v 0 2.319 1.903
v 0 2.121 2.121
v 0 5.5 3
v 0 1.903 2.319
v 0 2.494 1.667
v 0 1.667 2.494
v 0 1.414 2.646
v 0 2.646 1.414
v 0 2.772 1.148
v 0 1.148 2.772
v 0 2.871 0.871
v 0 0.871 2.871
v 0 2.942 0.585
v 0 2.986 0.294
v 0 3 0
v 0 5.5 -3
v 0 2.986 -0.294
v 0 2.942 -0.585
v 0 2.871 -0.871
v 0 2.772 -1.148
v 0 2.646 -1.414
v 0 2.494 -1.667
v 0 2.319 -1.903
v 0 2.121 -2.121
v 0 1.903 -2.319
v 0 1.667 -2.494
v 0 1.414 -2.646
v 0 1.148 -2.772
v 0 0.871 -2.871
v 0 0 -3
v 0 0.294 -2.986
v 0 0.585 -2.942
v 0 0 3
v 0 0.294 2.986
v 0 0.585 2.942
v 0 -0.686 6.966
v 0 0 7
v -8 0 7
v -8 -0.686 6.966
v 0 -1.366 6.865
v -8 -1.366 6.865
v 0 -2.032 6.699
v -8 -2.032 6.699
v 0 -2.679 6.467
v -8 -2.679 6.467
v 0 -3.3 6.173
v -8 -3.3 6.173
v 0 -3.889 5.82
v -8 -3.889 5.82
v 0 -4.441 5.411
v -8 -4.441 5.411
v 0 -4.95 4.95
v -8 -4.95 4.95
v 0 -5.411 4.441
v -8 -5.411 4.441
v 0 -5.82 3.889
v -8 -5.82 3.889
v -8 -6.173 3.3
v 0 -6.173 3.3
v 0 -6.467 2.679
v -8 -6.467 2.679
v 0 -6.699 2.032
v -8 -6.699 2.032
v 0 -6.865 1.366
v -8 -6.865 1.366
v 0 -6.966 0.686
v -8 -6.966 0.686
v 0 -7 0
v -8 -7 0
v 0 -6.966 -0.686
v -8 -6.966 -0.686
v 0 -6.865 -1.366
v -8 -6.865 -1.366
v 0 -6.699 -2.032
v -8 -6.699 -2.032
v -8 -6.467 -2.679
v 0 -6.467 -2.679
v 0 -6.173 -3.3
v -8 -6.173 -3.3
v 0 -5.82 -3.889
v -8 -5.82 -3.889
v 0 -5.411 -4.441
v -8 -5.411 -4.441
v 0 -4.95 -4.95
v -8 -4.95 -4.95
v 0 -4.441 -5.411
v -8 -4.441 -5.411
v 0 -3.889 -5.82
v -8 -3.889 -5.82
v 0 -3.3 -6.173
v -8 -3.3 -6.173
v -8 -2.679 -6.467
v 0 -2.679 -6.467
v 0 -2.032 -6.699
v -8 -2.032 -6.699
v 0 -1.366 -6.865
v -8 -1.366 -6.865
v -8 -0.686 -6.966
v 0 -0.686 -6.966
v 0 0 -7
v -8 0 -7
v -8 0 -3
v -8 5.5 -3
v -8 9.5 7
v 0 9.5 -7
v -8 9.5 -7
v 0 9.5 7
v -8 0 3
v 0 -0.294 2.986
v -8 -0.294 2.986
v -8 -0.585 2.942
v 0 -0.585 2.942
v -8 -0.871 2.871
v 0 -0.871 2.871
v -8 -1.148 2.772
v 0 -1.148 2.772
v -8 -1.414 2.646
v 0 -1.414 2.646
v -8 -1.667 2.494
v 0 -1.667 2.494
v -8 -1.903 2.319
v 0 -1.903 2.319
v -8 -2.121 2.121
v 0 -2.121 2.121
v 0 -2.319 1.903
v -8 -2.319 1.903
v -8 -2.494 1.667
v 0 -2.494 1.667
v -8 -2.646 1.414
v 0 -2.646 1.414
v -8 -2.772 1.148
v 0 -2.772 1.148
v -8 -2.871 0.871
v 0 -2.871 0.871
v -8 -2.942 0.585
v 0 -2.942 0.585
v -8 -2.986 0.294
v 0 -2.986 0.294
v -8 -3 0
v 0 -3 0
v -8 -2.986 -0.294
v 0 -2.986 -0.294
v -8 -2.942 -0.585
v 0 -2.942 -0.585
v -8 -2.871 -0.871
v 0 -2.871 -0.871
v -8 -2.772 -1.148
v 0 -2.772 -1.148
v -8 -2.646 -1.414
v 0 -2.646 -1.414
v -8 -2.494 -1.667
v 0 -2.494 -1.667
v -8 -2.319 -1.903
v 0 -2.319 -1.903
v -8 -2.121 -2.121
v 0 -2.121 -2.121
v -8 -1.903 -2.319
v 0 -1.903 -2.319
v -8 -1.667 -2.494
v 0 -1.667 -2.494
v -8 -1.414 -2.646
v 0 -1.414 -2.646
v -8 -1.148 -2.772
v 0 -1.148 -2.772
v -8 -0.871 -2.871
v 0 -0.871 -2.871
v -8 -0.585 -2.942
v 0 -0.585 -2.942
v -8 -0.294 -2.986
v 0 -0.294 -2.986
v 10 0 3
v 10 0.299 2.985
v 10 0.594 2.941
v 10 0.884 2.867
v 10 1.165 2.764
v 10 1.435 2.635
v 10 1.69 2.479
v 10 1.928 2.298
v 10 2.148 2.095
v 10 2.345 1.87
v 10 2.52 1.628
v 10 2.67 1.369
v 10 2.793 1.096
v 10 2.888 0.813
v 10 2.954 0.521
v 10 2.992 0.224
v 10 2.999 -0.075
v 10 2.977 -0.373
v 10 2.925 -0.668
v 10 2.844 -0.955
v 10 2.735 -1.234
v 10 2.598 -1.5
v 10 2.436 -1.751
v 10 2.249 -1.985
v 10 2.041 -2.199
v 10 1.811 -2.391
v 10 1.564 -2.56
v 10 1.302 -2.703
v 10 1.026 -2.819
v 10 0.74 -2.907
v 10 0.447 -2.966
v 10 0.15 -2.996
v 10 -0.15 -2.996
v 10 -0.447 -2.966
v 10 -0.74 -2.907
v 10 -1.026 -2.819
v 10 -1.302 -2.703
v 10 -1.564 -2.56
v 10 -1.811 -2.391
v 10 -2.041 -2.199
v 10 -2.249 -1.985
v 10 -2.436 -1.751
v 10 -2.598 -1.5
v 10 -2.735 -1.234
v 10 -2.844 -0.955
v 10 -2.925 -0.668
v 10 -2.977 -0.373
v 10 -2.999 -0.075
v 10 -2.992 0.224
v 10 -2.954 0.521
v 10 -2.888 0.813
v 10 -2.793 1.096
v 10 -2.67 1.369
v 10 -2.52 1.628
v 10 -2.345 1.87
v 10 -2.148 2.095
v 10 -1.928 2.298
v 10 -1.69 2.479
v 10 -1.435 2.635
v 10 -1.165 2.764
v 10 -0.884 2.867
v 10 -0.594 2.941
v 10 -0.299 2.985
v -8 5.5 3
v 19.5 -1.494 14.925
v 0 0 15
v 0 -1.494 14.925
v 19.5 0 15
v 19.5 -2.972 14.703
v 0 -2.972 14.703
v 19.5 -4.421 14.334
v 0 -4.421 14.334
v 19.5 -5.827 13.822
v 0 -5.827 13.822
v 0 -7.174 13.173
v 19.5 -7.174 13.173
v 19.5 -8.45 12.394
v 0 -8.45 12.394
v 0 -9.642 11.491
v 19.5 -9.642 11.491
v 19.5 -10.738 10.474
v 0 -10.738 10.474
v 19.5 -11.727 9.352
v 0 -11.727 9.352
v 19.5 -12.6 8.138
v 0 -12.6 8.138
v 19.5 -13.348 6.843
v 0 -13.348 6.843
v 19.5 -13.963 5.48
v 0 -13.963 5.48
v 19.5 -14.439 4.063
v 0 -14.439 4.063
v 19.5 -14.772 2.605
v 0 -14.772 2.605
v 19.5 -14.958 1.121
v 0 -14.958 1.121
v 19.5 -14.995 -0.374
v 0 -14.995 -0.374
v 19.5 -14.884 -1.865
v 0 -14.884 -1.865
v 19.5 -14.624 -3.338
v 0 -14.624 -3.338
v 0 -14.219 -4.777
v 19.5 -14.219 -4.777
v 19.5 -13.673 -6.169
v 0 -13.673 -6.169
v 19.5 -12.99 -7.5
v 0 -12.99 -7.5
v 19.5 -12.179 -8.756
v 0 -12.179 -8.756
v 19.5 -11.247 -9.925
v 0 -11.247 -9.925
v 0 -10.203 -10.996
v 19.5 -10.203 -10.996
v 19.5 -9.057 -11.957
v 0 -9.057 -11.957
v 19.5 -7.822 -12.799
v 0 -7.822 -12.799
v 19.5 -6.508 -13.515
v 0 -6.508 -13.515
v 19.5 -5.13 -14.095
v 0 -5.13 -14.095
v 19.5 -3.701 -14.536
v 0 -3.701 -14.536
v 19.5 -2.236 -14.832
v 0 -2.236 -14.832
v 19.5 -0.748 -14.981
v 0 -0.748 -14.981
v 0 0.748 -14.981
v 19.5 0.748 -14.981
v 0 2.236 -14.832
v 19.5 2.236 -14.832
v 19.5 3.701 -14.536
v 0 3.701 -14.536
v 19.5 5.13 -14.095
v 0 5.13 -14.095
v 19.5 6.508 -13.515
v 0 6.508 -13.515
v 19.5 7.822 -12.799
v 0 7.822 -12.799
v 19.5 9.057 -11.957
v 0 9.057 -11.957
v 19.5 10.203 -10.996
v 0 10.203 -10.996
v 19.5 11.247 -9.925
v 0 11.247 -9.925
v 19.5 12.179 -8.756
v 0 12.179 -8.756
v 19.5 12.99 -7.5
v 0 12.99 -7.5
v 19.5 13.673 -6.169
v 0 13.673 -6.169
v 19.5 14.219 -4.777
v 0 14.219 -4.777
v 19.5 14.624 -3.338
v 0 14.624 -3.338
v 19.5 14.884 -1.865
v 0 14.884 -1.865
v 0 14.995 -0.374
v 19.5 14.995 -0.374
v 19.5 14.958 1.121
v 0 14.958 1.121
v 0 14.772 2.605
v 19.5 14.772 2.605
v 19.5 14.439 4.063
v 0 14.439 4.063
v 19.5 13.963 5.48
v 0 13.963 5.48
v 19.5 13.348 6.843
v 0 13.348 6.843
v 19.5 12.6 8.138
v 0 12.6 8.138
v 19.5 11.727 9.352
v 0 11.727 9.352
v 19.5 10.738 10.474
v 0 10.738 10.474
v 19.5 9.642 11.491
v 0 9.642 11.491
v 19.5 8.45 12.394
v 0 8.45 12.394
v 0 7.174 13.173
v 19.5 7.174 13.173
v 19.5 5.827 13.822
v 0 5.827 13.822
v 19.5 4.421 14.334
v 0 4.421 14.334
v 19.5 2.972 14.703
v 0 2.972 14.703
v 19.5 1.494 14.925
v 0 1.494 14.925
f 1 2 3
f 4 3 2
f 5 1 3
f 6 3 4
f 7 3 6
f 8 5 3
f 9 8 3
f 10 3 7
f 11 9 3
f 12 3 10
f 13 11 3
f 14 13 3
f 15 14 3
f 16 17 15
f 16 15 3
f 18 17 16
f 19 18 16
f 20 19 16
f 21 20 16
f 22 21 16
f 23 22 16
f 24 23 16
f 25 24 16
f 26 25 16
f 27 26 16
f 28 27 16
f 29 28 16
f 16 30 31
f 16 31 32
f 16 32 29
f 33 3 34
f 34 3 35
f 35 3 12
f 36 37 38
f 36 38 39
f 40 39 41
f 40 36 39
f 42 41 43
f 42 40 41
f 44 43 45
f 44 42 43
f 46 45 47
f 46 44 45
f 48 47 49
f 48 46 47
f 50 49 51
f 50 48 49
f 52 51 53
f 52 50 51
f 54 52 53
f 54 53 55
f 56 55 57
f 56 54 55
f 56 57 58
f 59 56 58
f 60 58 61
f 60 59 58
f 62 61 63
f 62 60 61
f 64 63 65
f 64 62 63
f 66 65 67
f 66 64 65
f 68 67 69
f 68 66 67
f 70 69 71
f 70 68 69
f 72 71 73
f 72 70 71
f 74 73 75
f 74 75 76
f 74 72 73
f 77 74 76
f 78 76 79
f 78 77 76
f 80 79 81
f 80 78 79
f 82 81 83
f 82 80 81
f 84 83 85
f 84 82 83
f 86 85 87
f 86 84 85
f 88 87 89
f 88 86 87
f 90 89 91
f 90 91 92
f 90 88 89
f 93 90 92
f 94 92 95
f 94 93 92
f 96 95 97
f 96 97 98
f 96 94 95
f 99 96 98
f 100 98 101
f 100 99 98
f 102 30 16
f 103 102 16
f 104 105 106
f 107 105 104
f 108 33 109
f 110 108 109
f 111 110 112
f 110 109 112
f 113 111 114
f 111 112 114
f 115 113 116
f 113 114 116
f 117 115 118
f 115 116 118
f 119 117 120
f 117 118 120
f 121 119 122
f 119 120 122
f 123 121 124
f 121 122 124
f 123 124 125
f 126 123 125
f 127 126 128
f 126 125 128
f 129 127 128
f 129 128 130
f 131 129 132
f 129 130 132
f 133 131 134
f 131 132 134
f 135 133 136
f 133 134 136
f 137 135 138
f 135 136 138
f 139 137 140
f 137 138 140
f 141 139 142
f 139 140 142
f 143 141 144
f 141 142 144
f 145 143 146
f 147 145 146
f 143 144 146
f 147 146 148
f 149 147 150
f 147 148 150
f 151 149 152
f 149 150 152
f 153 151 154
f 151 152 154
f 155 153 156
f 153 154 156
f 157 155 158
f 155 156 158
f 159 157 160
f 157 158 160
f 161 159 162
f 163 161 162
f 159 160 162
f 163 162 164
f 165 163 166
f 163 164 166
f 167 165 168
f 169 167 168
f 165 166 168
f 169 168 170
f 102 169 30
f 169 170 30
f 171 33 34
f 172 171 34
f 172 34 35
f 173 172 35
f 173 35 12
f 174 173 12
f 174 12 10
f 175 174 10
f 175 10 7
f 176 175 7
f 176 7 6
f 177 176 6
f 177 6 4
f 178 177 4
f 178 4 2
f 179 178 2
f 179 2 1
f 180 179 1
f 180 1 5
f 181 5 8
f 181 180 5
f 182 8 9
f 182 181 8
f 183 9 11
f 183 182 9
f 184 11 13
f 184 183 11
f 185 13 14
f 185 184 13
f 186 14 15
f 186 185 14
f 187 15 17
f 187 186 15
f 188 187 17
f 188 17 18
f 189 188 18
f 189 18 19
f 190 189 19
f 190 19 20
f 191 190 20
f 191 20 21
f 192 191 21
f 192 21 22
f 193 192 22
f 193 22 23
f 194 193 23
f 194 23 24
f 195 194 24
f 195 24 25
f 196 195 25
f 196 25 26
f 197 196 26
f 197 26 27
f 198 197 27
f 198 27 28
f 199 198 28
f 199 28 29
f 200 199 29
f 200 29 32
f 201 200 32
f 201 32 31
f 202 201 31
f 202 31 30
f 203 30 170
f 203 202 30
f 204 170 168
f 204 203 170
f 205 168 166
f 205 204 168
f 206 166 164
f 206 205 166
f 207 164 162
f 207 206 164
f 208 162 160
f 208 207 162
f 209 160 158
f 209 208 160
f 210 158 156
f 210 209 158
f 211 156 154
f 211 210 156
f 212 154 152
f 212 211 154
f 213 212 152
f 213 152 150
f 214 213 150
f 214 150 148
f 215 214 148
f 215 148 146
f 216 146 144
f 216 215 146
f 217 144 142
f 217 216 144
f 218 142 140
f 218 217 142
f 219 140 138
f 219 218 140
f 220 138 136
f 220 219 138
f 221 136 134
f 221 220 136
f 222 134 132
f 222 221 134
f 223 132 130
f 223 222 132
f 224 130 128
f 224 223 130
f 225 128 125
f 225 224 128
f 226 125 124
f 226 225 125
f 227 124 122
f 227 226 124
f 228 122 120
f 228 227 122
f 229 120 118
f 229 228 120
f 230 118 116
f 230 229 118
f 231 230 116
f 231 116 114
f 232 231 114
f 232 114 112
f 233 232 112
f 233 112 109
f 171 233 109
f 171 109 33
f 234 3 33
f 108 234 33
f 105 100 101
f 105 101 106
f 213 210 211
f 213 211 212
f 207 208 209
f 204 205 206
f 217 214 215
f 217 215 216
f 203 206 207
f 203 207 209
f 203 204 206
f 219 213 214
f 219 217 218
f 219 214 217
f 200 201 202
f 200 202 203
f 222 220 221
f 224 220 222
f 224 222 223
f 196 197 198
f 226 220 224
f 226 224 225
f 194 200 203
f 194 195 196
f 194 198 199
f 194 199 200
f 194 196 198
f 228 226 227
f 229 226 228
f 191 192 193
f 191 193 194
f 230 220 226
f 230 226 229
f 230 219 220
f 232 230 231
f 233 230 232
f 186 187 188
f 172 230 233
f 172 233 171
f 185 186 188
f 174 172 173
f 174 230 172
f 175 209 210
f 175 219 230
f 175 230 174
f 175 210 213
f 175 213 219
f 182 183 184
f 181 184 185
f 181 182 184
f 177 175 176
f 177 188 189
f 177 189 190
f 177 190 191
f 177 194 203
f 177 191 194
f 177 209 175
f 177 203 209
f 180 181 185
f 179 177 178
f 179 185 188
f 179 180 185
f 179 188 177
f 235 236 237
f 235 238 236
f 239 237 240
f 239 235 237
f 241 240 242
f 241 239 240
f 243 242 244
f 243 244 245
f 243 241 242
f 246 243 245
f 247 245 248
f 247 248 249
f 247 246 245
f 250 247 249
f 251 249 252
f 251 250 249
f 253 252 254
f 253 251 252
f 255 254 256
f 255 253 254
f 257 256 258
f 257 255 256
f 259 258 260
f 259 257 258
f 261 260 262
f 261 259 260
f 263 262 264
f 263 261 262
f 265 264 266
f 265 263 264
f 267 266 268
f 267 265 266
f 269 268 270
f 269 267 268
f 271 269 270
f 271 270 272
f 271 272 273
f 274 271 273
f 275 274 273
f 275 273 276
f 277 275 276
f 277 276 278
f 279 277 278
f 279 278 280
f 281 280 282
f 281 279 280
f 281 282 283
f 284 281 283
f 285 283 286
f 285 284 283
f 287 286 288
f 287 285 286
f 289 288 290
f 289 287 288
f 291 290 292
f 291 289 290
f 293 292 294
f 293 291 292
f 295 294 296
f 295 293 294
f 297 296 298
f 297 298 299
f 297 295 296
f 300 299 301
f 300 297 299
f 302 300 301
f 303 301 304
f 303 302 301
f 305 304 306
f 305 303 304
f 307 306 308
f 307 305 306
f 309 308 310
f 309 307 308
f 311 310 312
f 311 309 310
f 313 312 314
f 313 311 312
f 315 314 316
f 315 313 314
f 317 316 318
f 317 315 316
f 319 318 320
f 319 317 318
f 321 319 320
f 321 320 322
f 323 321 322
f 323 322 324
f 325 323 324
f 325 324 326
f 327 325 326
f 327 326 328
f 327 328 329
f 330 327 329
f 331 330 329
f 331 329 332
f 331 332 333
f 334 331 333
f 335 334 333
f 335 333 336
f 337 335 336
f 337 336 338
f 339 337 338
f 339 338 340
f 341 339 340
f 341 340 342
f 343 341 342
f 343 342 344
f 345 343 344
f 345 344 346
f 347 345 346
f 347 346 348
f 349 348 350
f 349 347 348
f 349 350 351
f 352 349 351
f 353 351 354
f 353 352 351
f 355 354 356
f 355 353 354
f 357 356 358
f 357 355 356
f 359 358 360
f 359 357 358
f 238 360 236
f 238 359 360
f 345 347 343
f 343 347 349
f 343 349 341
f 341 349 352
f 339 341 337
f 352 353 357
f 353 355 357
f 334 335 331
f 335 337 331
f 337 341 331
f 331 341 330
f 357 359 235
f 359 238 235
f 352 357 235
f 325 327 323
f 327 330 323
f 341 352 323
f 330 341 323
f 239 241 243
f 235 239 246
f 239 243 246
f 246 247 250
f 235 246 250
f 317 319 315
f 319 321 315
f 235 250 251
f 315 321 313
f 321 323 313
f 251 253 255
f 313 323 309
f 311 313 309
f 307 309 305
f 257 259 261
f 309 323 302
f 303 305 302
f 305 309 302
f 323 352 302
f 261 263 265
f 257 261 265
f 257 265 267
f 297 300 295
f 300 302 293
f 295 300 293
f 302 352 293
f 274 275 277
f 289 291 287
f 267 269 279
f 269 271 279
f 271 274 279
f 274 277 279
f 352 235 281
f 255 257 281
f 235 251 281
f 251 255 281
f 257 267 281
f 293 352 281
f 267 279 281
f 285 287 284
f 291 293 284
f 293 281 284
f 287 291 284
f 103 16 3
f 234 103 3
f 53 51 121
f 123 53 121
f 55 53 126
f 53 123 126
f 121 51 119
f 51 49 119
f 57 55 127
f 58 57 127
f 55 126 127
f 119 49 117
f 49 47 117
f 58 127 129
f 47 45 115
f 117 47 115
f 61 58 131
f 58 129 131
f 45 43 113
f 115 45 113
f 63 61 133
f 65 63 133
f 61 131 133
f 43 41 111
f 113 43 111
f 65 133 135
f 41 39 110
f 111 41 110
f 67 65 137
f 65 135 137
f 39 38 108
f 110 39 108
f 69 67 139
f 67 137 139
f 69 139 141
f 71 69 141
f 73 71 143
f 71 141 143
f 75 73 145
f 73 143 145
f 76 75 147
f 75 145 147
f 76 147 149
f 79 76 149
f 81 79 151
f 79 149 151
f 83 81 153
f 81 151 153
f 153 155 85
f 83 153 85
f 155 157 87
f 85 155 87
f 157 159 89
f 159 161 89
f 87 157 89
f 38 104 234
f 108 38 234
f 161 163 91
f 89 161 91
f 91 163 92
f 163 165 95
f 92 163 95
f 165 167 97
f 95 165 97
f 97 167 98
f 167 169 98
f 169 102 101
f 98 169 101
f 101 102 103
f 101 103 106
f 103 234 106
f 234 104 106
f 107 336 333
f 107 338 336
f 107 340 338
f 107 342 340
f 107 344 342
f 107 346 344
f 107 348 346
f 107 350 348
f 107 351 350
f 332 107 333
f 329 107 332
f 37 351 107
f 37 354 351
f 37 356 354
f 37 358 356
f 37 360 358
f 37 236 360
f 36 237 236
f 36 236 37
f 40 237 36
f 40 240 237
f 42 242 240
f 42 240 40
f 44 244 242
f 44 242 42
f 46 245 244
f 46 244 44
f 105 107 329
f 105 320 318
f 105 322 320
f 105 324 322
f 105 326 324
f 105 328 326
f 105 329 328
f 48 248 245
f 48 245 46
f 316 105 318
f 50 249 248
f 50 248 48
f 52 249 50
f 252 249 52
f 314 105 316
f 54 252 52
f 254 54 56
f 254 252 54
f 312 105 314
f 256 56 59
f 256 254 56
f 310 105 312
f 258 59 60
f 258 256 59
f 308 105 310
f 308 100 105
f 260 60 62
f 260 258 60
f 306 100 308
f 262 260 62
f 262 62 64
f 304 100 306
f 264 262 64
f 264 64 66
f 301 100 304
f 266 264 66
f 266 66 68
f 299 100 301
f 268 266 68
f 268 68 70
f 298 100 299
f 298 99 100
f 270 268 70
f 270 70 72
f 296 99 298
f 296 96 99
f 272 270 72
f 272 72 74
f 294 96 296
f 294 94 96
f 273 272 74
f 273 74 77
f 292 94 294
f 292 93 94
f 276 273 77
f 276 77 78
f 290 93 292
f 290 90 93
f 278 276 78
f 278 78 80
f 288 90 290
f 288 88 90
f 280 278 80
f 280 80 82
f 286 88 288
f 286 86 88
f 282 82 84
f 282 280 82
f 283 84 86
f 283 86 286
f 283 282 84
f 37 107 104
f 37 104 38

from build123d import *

# Parameters (mm, degrees)
SKETCH1_W           = 19.5
SKETCH1_H           = 15
BOSS_EXTRUDE1_DEPTH = 8
CUT_EXTRUDE1_START  = -10
SKETCH3_R           = 3
CUT_EXTRUDE1_DEPTH  = 10


with BuildPart() as part:
    # Sketch1 → Revolve1 (revolve)
    with BuildSketch(Plane.XY, mode=Mode.PRIVATE) as revolve1_sk:
        with Locations((9.75, 7.5)):
            Rectangle(SKETCH1_W, SKETCH1_H)
    revolve(revolve1_sk.sketch.rotate(Axis((0, 0, 0), (1, 0, 0)), 90), axis=Axis((0, 0, 0), (1, 0, 0)))

    # Sketch2 → Boss-Extrude1 (add)
    with BuildSketch(Plane.ZY):
        with BuildLine():
            Line((-7, 0), (-7, 9.5))
            Line((-7, 9.5), (7, 9.5))
            Line((7, 9.5), (7, 0))
            ThreePointArc((7, 0), (0, -7), (-7, 0))
        make_face()
        with BuildLine():
            Line((-3, 0), (-3, 5.5))
            Line((-3, 5.5), (3, 5.5))
            Line((3, 5.5), (3, 0))
            ThreePointArc((3, 0), (0, -3), (-3, 0))
        make_face(mode=Mode.SUBTRACT)
    extrude(amount=BOSS_EXTRUDE1_DEPTH)

    # Sketch3 → Cut-Extrude1 (cut)
    with BuildSketch(Plane.ZY.offset(CUT_EXTRUDE1_START)):
        Circle(SKETCH3_R)
    extrude(amount=CUT_EXTRUDE1_DEPTH, mode=Mode.SUBTRACT)


solid = part.part
